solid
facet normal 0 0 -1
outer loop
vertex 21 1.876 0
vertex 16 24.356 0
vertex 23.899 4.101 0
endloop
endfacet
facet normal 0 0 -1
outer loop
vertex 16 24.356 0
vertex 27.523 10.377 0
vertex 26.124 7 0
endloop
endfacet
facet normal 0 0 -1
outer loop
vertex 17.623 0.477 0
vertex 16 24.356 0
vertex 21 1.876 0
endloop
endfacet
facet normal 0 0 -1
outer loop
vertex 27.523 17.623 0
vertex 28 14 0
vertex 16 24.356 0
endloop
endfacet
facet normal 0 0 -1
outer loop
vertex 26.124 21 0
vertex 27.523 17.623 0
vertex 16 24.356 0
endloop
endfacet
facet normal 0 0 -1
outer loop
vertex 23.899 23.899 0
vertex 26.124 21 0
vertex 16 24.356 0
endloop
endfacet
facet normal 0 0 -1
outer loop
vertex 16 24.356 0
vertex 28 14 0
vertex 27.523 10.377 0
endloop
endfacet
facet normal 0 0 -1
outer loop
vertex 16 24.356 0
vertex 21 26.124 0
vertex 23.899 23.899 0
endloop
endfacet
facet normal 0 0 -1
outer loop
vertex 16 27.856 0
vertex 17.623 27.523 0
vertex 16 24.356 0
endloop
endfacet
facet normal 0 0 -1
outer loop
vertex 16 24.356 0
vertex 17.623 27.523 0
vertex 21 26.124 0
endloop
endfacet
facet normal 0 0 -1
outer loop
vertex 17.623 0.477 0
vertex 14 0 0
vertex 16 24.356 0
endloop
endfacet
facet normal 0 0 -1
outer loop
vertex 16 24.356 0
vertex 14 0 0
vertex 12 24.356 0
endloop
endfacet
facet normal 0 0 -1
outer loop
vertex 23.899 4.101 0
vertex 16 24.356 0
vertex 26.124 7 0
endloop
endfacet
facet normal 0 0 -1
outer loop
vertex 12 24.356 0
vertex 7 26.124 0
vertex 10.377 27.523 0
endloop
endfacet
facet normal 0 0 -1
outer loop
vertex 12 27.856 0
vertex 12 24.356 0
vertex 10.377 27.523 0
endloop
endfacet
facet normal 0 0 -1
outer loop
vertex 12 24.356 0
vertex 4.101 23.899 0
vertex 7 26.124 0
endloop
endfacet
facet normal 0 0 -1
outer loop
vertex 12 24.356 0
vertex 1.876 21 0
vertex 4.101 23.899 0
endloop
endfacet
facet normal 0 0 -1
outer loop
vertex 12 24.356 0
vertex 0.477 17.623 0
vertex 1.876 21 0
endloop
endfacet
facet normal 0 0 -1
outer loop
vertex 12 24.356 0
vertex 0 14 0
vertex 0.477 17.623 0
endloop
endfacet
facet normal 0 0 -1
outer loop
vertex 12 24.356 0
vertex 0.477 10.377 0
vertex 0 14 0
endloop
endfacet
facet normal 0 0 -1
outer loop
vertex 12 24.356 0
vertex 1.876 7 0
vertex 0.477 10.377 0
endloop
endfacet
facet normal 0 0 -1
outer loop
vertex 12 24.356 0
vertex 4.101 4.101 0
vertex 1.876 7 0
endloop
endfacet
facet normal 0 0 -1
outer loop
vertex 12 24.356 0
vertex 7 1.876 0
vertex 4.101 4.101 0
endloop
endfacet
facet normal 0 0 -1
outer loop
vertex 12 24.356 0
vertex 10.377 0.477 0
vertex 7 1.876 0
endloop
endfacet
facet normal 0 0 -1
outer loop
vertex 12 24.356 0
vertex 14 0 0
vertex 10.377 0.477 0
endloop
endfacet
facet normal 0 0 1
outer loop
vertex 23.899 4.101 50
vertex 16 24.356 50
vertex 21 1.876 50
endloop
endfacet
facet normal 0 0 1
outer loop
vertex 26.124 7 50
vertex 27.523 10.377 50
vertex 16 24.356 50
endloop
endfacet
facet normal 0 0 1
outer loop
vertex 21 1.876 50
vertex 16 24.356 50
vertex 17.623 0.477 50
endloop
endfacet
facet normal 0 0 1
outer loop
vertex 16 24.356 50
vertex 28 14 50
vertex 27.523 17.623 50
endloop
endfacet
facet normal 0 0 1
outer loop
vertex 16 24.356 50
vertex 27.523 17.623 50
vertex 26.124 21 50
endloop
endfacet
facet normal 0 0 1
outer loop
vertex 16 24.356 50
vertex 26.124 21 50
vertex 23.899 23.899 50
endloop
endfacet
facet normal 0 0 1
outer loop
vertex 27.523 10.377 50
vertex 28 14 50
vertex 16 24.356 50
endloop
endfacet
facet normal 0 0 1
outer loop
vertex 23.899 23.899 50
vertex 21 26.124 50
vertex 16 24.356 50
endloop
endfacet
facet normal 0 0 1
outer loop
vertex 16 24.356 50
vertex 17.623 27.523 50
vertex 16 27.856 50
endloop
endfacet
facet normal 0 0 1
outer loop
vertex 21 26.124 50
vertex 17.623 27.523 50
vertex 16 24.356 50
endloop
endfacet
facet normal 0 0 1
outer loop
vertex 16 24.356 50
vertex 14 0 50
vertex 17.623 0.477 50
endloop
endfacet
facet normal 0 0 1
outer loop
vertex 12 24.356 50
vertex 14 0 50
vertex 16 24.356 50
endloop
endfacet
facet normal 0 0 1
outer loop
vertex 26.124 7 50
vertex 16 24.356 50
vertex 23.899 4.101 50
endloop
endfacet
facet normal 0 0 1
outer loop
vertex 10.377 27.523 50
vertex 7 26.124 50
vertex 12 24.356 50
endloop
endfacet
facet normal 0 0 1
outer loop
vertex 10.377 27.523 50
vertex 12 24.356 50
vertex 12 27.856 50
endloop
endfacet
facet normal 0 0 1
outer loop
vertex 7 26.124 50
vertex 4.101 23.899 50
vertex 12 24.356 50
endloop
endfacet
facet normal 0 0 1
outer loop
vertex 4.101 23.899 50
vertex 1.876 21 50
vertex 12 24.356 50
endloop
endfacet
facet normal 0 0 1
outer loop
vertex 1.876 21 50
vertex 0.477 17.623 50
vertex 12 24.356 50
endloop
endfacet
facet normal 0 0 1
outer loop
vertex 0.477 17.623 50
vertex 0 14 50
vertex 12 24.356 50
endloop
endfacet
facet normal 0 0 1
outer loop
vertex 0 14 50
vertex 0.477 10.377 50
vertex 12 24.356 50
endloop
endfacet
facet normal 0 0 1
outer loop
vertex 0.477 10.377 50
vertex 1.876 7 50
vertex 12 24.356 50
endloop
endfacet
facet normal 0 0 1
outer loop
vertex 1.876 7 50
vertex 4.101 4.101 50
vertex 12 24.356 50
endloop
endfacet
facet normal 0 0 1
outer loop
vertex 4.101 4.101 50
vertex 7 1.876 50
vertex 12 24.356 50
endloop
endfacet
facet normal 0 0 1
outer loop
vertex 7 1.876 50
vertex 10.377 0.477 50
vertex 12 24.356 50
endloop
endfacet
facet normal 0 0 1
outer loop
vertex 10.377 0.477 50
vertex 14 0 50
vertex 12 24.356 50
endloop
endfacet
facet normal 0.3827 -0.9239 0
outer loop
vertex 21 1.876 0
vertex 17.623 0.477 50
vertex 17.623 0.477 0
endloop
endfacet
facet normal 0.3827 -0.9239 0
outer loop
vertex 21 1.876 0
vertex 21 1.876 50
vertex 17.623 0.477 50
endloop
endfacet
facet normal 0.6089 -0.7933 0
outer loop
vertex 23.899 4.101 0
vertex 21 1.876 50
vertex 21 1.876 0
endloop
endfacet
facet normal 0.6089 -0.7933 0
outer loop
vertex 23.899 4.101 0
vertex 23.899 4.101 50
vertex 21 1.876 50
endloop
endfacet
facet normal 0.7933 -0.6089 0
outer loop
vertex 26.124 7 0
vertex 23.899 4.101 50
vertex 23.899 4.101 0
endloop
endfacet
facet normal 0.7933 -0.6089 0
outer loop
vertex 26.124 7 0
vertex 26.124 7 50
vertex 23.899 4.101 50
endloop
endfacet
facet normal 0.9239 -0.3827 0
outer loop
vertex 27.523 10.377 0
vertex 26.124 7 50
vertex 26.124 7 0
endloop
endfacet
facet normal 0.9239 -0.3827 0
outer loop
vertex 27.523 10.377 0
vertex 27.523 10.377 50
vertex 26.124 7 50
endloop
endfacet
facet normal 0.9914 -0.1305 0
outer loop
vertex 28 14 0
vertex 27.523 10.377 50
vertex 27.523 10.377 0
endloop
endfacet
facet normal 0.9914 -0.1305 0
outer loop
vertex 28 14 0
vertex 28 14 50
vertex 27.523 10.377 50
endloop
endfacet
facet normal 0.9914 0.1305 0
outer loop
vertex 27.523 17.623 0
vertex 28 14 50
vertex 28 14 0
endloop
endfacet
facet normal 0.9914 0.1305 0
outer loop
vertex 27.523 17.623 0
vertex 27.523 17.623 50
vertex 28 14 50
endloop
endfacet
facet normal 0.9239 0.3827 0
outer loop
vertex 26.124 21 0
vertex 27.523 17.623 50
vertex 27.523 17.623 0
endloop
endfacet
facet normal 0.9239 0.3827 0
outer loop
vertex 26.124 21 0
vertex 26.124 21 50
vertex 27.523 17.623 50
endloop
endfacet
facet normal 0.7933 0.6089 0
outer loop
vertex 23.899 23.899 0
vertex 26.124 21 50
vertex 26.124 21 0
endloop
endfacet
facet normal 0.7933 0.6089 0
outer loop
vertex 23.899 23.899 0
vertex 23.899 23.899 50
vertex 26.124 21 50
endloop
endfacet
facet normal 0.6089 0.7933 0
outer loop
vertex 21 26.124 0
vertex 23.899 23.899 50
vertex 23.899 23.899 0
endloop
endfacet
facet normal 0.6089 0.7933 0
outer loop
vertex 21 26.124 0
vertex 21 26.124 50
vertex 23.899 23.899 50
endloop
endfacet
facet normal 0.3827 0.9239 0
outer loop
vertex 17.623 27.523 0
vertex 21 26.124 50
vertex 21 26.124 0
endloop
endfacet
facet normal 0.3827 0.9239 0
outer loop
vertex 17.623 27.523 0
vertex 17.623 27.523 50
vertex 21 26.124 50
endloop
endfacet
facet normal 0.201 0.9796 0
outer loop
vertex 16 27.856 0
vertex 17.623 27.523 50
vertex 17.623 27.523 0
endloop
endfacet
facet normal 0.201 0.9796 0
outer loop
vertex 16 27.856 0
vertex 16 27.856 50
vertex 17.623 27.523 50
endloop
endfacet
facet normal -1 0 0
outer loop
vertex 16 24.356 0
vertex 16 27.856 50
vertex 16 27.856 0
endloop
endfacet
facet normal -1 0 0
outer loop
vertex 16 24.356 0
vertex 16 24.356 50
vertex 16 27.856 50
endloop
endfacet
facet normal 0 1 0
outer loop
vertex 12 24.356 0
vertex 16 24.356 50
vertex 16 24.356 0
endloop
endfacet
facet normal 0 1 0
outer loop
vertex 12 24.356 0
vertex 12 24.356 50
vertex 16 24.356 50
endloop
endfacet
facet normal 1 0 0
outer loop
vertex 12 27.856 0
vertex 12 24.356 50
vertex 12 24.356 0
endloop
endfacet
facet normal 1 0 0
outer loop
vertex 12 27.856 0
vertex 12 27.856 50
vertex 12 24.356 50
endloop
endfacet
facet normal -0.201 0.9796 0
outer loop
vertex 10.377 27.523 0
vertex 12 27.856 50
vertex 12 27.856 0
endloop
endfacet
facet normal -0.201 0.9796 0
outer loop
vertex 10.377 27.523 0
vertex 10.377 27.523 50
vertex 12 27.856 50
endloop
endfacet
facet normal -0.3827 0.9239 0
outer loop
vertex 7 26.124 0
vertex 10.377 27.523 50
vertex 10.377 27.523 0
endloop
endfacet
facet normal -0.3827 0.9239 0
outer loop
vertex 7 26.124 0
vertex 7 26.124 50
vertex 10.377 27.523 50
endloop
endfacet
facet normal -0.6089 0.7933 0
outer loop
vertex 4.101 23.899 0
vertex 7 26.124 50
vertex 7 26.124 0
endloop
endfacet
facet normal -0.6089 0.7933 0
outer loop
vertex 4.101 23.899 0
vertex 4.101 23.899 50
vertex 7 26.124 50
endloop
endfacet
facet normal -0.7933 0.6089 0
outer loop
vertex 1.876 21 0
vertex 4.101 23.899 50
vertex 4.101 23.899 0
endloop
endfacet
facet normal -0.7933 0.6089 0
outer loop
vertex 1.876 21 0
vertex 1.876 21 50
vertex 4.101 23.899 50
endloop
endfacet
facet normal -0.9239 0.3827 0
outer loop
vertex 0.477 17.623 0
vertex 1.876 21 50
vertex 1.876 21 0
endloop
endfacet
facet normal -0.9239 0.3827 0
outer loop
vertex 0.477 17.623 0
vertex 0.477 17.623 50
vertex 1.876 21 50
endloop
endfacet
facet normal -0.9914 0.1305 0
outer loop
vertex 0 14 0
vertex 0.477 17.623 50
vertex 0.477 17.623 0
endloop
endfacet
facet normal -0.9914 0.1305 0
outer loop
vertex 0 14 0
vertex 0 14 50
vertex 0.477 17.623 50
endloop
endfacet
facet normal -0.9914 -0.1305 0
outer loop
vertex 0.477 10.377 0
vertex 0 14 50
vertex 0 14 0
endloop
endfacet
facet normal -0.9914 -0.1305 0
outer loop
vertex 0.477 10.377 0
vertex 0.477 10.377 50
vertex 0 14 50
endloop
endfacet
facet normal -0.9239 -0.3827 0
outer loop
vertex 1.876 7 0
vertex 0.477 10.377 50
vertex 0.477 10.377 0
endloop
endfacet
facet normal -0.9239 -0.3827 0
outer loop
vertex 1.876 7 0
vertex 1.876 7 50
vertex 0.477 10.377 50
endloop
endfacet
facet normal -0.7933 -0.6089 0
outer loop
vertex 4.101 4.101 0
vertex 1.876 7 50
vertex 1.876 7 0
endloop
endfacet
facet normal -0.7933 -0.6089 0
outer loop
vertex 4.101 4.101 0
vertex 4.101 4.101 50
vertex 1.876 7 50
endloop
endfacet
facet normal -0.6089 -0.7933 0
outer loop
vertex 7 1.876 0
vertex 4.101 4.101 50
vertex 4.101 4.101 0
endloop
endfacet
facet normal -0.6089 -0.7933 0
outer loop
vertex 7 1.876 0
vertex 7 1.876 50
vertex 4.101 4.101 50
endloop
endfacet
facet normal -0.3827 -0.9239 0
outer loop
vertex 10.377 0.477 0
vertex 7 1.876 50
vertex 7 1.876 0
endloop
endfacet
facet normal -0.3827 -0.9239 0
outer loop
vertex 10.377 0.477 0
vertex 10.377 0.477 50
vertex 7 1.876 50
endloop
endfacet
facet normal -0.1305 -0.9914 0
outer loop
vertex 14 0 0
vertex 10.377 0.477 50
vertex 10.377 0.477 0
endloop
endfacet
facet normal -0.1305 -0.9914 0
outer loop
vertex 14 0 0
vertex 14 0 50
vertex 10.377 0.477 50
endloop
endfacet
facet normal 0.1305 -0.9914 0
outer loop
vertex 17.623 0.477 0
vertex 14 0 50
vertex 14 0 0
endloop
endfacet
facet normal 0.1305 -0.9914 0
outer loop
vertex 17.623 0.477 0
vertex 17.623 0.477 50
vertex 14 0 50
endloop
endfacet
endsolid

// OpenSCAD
$fn = 32;

// ----------------------------------------------------------------------
// Keyway shaft: d28 shaft, key 4 x 3.5 mm
// ----------------------------------------------------------------------

// --- parameters (mm) ---
shaft_r = 14;             // shaft radius
key_w = 4;                // keyway width
key_d = 3.5;              // keyway depth below the surface line
plate_t = 50;             // shaft length, Z (extrusion height)
fit_tol = 0.1;            // declared fit tolerance (prompt contract)
free_tol = 0.5;           // declared free tolerance (prompt contract)

shaft_d = 2 * shaft_r;  // shaft diameter
circle_step = 15;  // polygon sampling step, degrees

profile = [[10.377, 27.523], [7, 26.124], [4.101, 23.899], [1.876, 21], [0.477, 17.623], [0, 14], [0.477, 10.377], [1.876, 7], [4.101, 4.101], [7, 1.876], [10.377, 0.477], [14, 0], [17.623, 0.477], [21, 1.876], [23.899, 4.101], [26.124, 7], [27.523, 10.377], [28, 14], [27.523, 17.623], [26.124, 21], [23.899, 23.899], [21, 26.124], [17.623, 27.523], [16, 27.856], [16, 24.356], [12, 24.356], [12, 27.856]];  // primary outline, 27 points, counter clockwise

// --- the one profile operation ---
linear_extrude(height = plate_t) polygon(points = profile);
